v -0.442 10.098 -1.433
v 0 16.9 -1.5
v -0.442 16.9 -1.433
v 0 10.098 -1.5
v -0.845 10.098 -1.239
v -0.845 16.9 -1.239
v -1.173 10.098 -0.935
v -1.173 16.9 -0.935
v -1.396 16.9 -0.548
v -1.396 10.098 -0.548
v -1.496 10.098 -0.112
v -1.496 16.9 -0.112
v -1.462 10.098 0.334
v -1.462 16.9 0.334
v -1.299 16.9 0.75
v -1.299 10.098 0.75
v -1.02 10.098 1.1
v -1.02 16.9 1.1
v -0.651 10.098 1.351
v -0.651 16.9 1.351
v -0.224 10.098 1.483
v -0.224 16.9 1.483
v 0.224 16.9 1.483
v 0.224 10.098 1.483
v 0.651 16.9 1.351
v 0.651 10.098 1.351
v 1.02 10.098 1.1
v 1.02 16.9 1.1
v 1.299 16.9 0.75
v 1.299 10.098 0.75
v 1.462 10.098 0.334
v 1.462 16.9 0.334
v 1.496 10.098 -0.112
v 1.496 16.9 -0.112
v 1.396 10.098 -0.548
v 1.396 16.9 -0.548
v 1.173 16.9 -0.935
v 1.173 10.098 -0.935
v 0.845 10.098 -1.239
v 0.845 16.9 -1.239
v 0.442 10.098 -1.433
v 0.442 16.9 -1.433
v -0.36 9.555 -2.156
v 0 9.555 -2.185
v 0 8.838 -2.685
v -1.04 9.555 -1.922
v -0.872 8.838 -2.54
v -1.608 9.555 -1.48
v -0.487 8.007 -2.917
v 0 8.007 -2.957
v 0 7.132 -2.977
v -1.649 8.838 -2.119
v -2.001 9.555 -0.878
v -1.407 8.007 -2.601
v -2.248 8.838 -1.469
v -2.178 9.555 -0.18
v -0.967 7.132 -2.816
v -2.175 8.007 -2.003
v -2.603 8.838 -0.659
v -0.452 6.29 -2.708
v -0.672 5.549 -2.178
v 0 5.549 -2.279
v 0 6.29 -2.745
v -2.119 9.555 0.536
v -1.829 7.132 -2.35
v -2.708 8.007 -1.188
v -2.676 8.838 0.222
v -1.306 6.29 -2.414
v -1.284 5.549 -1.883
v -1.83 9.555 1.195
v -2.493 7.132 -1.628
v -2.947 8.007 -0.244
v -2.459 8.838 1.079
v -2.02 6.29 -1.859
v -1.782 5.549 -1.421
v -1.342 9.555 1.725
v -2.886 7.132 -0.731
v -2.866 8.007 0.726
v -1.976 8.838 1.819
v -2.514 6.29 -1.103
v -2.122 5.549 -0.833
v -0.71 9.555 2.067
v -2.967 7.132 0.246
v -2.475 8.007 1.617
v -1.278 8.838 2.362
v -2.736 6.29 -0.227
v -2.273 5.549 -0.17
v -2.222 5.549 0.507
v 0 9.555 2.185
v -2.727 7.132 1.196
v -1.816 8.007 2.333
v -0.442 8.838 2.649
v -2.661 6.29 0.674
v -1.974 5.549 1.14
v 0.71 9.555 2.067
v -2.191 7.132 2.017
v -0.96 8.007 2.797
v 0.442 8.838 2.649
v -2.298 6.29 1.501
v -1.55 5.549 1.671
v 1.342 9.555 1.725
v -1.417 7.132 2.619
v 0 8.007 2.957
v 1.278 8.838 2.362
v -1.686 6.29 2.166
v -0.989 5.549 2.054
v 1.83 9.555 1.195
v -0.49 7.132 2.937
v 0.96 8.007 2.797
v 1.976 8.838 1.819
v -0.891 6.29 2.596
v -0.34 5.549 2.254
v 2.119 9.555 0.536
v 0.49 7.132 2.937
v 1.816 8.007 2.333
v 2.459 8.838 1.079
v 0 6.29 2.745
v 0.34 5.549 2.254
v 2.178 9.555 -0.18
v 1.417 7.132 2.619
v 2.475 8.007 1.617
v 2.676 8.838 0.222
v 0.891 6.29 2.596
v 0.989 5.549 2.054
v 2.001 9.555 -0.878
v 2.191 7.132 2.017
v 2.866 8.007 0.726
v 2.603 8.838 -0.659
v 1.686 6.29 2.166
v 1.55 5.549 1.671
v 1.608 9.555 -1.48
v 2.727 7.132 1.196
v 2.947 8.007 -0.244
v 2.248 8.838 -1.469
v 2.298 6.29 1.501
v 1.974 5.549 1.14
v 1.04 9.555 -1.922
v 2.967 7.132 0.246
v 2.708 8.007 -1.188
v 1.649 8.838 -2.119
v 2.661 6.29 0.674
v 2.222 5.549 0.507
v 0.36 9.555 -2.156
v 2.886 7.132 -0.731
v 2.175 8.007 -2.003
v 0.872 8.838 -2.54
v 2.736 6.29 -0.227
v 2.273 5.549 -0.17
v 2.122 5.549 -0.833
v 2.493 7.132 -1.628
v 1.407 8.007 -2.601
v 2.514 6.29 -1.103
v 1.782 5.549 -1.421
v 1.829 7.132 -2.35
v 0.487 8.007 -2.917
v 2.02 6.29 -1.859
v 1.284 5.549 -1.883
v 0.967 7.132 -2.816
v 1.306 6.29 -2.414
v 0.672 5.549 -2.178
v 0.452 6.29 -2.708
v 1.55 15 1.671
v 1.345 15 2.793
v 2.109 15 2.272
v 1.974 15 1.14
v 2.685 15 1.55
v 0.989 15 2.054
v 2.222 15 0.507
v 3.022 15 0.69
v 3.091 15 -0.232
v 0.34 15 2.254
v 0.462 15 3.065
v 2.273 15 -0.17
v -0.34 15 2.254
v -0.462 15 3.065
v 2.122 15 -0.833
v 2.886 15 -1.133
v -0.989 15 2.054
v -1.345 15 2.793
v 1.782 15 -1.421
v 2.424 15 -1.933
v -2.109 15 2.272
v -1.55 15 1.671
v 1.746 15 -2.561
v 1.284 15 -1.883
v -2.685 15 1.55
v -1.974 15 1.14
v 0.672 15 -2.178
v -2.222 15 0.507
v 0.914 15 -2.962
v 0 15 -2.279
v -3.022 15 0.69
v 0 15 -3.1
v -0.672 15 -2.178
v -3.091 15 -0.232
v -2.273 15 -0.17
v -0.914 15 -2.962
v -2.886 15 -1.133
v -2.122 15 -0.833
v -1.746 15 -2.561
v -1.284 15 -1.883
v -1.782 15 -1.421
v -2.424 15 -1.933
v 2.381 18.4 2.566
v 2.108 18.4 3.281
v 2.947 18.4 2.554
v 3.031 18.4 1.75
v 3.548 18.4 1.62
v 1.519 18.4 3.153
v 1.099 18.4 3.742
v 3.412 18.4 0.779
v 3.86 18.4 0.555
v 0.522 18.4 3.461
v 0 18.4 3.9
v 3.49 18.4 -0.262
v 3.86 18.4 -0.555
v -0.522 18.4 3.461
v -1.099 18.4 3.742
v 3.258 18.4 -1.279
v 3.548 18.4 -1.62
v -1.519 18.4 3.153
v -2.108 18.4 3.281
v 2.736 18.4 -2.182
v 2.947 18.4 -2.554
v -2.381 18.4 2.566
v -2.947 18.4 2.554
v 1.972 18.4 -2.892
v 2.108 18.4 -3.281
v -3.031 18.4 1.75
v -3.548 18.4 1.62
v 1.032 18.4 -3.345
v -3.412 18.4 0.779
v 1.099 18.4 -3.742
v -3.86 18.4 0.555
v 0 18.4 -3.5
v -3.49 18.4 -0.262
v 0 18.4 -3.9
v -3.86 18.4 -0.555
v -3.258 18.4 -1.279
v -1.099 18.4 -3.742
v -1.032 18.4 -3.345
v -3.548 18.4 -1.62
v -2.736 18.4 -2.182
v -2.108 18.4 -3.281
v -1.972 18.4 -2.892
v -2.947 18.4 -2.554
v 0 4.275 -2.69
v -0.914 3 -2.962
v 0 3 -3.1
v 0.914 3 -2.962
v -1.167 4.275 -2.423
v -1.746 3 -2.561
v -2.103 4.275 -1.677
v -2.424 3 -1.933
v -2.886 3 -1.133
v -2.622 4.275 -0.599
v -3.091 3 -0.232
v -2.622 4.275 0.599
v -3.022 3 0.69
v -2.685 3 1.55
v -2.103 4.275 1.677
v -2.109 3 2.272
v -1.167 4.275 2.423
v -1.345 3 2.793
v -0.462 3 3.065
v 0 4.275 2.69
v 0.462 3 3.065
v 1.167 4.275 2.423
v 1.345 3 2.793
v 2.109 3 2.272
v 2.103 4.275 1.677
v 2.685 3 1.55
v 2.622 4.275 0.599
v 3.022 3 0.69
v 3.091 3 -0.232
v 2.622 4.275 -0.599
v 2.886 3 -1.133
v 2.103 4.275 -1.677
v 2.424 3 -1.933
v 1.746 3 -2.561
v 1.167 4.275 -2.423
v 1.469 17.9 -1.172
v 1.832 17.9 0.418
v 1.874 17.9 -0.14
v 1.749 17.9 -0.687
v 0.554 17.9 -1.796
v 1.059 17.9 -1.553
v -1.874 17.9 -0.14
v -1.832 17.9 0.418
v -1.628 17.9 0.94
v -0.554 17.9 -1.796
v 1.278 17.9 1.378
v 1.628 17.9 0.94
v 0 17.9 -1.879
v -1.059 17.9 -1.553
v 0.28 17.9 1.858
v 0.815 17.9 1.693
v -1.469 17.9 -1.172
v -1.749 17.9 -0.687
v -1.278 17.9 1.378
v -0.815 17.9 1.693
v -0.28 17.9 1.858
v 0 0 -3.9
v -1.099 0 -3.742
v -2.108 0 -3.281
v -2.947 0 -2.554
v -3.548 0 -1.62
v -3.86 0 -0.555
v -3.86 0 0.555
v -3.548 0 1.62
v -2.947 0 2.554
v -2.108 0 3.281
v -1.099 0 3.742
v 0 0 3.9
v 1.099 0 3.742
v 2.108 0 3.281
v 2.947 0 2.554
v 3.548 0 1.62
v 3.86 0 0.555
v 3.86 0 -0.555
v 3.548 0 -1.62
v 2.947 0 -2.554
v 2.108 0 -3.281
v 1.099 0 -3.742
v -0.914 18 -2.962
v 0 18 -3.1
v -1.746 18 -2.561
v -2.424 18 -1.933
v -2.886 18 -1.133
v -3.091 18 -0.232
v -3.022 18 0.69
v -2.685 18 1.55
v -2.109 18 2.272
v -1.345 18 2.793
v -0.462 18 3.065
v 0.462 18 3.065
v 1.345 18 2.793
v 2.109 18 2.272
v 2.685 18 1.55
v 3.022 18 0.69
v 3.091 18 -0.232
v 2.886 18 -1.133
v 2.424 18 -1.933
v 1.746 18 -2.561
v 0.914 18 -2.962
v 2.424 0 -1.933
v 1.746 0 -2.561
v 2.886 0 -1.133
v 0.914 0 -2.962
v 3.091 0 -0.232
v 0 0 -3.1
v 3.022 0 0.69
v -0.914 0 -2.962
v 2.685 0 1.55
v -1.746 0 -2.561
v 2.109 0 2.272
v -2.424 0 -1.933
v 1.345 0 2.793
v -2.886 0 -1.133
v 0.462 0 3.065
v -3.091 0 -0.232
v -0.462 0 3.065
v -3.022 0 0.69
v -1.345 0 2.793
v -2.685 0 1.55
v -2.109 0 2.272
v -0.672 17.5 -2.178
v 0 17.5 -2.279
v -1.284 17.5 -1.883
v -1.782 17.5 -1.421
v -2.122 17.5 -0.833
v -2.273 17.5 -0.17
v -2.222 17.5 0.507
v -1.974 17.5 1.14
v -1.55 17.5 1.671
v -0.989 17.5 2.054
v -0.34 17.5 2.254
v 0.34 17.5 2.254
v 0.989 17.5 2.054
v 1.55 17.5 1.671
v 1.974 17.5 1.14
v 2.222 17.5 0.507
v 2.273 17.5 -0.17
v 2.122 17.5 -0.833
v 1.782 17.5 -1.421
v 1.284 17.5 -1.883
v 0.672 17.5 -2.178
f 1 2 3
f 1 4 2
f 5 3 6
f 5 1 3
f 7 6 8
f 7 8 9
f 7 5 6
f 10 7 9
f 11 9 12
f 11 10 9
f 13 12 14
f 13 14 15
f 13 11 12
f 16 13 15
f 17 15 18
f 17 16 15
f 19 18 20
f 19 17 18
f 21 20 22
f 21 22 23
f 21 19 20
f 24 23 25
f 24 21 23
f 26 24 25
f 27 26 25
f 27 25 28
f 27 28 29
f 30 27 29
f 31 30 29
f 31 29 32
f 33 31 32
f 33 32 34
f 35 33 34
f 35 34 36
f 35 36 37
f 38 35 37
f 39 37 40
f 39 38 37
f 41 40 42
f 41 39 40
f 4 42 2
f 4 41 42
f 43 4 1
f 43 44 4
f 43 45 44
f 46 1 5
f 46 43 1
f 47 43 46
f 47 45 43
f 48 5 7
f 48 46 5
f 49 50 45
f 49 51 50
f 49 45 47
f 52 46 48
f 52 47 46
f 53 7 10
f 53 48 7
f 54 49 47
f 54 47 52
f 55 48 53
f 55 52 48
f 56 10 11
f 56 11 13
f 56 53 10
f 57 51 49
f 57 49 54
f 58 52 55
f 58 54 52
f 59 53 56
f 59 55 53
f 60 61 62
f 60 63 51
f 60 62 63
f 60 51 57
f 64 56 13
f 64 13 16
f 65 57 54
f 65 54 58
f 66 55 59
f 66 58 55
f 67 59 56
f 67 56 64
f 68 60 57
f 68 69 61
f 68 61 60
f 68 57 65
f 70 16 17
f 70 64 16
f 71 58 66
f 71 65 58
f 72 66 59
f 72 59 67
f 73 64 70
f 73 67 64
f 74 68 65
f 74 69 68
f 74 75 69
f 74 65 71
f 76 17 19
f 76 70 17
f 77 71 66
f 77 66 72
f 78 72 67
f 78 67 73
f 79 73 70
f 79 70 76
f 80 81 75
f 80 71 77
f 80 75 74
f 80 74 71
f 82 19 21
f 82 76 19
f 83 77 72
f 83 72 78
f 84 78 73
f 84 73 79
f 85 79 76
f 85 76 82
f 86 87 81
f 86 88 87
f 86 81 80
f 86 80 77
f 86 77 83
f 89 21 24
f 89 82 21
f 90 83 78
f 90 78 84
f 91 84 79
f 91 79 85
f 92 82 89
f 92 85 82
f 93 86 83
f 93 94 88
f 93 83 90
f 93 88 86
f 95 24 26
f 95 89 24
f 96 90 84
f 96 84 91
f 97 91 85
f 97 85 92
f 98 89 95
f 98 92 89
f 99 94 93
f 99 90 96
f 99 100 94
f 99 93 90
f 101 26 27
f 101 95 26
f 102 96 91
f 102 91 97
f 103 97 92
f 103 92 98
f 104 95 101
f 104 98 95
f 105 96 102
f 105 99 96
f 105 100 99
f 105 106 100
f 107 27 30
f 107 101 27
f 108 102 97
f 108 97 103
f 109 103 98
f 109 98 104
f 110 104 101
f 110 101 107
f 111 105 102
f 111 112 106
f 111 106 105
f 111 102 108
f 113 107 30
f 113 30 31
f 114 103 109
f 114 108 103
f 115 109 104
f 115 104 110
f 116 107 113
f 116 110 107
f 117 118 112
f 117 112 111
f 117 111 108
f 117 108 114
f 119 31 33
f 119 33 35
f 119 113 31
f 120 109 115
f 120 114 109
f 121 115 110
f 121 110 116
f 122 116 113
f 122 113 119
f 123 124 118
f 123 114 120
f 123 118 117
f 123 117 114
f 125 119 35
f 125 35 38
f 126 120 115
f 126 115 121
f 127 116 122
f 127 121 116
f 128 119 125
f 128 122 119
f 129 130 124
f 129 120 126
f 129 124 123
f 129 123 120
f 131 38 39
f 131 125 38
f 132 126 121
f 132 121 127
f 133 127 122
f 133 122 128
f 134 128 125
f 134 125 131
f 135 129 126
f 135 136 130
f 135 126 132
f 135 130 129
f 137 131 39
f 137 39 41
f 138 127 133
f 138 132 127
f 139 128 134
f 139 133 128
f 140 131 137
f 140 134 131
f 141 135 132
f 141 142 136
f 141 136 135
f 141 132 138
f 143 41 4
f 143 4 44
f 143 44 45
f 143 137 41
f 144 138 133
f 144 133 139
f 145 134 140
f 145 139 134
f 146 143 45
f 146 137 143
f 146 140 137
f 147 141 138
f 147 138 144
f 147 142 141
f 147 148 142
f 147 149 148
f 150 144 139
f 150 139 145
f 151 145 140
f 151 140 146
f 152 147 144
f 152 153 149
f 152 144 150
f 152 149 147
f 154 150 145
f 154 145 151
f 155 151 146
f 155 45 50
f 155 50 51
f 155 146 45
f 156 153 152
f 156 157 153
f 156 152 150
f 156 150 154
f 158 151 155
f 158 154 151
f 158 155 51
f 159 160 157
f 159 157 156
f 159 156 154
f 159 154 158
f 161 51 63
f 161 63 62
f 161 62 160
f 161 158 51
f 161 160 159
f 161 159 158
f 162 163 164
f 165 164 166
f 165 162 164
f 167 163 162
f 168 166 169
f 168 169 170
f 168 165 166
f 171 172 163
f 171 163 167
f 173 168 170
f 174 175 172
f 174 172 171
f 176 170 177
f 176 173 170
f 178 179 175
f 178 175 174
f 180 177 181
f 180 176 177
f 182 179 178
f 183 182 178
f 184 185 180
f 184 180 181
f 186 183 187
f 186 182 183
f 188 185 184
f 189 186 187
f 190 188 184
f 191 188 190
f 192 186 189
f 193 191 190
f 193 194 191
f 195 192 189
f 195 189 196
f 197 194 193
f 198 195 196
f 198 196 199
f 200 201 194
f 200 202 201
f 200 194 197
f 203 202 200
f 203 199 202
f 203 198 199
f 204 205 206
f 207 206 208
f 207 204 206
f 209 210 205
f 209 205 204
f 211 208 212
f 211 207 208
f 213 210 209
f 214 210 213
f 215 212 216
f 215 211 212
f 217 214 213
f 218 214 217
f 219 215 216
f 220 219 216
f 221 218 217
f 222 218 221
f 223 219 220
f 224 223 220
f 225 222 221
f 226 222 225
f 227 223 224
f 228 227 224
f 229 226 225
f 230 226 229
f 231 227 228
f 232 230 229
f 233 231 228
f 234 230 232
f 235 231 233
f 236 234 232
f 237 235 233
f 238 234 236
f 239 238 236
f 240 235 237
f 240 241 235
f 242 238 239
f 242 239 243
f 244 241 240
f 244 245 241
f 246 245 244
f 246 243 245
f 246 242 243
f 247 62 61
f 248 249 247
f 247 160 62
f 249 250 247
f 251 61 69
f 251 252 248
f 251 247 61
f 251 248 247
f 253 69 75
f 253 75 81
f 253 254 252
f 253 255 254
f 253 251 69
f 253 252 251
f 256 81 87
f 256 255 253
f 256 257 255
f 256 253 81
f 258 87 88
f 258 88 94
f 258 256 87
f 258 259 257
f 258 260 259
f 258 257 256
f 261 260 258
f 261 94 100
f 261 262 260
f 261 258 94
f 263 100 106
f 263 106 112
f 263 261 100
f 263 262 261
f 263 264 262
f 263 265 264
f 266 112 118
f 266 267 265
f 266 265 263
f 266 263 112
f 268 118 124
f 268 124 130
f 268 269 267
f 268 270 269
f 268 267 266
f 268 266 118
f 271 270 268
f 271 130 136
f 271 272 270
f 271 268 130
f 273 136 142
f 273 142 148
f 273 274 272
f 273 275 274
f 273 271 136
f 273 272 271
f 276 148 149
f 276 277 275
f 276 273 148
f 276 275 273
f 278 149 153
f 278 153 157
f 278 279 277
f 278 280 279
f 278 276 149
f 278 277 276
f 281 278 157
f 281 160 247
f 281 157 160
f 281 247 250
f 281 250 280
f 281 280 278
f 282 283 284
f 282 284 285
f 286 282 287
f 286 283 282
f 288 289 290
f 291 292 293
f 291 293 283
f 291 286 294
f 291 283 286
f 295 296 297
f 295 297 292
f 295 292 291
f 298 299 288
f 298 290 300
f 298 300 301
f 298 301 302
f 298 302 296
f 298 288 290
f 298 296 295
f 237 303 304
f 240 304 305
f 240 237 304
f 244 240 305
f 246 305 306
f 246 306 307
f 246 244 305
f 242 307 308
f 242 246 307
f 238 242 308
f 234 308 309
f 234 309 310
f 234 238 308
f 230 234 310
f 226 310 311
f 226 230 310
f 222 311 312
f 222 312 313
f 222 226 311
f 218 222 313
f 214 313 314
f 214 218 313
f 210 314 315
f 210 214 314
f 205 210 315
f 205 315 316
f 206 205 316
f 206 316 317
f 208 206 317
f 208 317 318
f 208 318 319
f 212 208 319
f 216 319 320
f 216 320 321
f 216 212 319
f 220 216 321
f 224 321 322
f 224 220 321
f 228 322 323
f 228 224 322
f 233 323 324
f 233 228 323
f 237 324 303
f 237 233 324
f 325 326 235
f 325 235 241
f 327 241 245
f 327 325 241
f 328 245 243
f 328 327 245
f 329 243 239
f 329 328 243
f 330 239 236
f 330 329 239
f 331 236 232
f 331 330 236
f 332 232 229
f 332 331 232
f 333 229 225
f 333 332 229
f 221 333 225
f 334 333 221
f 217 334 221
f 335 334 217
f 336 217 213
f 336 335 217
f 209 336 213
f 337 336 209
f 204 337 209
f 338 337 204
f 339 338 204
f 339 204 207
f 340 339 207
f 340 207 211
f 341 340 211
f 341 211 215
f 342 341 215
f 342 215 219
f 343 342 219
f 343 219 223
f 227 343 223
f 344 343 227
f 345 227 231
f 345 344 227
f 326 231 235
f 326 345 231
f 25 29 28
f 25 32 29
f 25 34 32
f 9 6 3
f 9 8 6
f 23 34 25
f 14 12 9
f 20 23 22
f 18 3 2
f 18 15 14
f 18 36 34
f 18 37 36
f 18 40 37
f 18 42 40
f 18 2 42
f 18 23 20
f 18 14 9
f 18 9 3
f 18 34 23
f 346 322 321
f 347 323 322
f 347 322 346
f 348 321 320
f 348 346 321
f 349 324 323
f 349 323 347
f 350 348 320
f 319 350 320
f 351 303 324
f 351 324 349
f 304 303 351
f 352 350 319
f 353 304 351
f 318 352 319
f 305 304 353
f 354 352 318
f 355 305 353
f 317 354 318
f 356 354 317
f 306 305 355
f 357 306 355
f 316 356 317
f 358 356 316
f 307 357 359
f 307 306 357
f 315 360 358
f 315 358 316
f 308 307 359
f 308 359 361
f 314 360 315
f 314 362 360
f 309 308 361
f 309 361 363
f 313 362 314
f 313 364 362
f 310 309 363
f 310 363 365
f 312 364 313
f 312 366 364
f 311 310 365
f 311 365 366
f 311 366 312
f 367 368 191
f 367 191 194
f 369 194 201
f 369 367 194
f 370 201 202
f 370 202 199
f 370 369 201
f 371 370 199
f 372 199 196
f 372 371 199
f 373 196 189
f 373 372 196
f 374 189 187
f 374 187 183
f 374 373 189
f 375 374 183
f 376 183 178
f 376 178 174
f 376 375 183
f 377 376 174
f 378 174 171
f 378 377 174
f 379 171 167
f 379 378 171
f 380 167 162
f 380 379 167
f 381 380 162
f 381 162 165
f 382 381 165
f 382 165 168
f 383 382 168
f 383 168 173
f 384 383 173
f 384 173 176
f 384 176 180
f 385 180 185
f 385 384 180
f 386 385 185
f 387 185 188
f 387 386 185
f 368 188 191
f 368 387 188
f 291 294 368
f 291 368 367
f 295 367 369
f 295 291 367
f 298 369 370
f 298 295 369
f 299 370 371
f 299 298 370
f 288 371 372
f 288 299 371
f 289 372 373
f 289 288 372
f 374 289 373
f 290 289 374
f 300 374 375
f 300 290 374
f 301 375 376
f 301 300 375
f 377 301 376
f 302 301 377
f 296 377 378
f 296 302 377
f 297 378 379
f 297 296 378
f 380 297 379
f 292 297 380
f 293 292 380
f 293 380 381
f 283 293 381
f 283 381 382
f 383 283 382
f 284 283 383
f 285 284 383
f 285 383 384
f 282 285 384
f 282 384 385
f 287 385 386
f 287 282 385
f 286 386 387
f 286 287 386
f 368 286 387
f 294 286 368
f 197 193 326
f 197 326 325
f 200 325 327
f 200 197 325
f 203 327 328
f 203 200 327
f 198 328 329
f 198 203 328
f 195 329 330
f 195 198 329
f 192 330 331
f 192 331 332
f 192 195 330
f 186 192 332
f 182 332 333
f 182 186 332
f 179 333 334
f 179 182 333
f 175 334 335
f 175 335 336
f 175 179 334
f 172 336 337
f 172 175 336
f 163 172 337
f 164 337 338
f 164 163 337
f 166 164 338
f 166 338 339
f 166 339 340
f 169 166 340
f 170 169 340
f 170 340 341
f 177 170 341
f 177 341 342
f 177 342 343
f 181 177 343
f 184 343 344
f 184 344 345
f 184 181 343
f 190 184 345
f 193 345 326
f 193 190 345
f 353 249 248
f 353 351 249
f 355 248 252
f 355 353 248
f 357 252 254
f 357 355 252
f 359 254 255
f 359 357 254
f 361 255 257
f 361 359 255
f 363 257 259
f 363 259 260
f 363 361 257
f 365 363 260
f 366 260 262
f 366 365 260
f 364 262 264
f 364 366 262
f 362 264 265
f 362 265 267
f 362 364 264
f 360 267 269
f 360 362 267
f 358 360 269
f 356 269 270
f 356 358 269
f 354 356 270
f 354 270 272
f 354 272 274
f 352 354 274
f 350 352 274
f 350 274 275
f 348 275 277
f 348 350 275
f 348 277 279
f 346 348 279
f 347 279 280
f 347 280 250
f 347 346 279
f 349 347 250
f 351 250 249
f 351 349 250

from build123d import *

# Parameters (mm, degrees)
CHANFREIN1_SIZE = 0.4
CHANFREIN2_SIZE = 0.4


with BuildPart() as part:
    # Esquisse1 → Base-Révolution (revolve)
    with BuildSketch(Plane.XY, mode=Mode.PRIVATE) as base_r_volution_sk:
        with BuildLine():
            Line((-3.1, 0), (-3.9, 0))
            Line((-3.9, 0), (-3.9, 18.4))
            Line((-3.9, 18.4), (-3.1, 18.4))
            Line((-3.1, 18.4), (-3.1, 17.6))
            Line((-3.1, 17.6), (-3.1, 15))
            Line((-3.1, 15), (-2.279338742, 15))
            Line((-2.279338742, 15), (-2.279338742, 17.9))
            Line((-2.279338742, 17.9), (0, 17.9))
            Line((0, 17.9), (0, 16.9))
            Line((0, 16.9), (-1.5, 16.9))
            Line((-1.5, 16.9), (-1.5, 10.098076211))
            ThreePointArc((-1.5, 10.098076211), (-2.956912699, 8.006623421), (-2.279338742, 5.549457793))
            Line((-2.279338742, 5.549457793), (-3.1, 3))
            Line((-3.1, 3), (-3.1, 0.8))
            Line((-3.1, 0.8), (-3.1, 0))
        make_face()
    revolve(base_r_volution_sk.sketch.rotate(Axis((0, 0, 0), (0, 1, 0)), 270), axis=Axis((0, 0, 0), (0, 1, 0)))

    # Chanfrein1
    chanfrein1_edges = [part.edges().sort_by_distance(p)[0] for p in [
        (0, 18.4, 3.1),
    ]]
    chamfer(chanfrein1_edges, length=CHANFREIN1_SIZE)

    # Chanfrein2
    chanfrein2_edges = [part.edges().sort_by_distance(p)[0] for p in [
        (0, 17.9, 2.279338742),
    ]]
    chamfer(chanfrein2_edges, length=CHANFREIN2_SIZE)


solid = part.part
